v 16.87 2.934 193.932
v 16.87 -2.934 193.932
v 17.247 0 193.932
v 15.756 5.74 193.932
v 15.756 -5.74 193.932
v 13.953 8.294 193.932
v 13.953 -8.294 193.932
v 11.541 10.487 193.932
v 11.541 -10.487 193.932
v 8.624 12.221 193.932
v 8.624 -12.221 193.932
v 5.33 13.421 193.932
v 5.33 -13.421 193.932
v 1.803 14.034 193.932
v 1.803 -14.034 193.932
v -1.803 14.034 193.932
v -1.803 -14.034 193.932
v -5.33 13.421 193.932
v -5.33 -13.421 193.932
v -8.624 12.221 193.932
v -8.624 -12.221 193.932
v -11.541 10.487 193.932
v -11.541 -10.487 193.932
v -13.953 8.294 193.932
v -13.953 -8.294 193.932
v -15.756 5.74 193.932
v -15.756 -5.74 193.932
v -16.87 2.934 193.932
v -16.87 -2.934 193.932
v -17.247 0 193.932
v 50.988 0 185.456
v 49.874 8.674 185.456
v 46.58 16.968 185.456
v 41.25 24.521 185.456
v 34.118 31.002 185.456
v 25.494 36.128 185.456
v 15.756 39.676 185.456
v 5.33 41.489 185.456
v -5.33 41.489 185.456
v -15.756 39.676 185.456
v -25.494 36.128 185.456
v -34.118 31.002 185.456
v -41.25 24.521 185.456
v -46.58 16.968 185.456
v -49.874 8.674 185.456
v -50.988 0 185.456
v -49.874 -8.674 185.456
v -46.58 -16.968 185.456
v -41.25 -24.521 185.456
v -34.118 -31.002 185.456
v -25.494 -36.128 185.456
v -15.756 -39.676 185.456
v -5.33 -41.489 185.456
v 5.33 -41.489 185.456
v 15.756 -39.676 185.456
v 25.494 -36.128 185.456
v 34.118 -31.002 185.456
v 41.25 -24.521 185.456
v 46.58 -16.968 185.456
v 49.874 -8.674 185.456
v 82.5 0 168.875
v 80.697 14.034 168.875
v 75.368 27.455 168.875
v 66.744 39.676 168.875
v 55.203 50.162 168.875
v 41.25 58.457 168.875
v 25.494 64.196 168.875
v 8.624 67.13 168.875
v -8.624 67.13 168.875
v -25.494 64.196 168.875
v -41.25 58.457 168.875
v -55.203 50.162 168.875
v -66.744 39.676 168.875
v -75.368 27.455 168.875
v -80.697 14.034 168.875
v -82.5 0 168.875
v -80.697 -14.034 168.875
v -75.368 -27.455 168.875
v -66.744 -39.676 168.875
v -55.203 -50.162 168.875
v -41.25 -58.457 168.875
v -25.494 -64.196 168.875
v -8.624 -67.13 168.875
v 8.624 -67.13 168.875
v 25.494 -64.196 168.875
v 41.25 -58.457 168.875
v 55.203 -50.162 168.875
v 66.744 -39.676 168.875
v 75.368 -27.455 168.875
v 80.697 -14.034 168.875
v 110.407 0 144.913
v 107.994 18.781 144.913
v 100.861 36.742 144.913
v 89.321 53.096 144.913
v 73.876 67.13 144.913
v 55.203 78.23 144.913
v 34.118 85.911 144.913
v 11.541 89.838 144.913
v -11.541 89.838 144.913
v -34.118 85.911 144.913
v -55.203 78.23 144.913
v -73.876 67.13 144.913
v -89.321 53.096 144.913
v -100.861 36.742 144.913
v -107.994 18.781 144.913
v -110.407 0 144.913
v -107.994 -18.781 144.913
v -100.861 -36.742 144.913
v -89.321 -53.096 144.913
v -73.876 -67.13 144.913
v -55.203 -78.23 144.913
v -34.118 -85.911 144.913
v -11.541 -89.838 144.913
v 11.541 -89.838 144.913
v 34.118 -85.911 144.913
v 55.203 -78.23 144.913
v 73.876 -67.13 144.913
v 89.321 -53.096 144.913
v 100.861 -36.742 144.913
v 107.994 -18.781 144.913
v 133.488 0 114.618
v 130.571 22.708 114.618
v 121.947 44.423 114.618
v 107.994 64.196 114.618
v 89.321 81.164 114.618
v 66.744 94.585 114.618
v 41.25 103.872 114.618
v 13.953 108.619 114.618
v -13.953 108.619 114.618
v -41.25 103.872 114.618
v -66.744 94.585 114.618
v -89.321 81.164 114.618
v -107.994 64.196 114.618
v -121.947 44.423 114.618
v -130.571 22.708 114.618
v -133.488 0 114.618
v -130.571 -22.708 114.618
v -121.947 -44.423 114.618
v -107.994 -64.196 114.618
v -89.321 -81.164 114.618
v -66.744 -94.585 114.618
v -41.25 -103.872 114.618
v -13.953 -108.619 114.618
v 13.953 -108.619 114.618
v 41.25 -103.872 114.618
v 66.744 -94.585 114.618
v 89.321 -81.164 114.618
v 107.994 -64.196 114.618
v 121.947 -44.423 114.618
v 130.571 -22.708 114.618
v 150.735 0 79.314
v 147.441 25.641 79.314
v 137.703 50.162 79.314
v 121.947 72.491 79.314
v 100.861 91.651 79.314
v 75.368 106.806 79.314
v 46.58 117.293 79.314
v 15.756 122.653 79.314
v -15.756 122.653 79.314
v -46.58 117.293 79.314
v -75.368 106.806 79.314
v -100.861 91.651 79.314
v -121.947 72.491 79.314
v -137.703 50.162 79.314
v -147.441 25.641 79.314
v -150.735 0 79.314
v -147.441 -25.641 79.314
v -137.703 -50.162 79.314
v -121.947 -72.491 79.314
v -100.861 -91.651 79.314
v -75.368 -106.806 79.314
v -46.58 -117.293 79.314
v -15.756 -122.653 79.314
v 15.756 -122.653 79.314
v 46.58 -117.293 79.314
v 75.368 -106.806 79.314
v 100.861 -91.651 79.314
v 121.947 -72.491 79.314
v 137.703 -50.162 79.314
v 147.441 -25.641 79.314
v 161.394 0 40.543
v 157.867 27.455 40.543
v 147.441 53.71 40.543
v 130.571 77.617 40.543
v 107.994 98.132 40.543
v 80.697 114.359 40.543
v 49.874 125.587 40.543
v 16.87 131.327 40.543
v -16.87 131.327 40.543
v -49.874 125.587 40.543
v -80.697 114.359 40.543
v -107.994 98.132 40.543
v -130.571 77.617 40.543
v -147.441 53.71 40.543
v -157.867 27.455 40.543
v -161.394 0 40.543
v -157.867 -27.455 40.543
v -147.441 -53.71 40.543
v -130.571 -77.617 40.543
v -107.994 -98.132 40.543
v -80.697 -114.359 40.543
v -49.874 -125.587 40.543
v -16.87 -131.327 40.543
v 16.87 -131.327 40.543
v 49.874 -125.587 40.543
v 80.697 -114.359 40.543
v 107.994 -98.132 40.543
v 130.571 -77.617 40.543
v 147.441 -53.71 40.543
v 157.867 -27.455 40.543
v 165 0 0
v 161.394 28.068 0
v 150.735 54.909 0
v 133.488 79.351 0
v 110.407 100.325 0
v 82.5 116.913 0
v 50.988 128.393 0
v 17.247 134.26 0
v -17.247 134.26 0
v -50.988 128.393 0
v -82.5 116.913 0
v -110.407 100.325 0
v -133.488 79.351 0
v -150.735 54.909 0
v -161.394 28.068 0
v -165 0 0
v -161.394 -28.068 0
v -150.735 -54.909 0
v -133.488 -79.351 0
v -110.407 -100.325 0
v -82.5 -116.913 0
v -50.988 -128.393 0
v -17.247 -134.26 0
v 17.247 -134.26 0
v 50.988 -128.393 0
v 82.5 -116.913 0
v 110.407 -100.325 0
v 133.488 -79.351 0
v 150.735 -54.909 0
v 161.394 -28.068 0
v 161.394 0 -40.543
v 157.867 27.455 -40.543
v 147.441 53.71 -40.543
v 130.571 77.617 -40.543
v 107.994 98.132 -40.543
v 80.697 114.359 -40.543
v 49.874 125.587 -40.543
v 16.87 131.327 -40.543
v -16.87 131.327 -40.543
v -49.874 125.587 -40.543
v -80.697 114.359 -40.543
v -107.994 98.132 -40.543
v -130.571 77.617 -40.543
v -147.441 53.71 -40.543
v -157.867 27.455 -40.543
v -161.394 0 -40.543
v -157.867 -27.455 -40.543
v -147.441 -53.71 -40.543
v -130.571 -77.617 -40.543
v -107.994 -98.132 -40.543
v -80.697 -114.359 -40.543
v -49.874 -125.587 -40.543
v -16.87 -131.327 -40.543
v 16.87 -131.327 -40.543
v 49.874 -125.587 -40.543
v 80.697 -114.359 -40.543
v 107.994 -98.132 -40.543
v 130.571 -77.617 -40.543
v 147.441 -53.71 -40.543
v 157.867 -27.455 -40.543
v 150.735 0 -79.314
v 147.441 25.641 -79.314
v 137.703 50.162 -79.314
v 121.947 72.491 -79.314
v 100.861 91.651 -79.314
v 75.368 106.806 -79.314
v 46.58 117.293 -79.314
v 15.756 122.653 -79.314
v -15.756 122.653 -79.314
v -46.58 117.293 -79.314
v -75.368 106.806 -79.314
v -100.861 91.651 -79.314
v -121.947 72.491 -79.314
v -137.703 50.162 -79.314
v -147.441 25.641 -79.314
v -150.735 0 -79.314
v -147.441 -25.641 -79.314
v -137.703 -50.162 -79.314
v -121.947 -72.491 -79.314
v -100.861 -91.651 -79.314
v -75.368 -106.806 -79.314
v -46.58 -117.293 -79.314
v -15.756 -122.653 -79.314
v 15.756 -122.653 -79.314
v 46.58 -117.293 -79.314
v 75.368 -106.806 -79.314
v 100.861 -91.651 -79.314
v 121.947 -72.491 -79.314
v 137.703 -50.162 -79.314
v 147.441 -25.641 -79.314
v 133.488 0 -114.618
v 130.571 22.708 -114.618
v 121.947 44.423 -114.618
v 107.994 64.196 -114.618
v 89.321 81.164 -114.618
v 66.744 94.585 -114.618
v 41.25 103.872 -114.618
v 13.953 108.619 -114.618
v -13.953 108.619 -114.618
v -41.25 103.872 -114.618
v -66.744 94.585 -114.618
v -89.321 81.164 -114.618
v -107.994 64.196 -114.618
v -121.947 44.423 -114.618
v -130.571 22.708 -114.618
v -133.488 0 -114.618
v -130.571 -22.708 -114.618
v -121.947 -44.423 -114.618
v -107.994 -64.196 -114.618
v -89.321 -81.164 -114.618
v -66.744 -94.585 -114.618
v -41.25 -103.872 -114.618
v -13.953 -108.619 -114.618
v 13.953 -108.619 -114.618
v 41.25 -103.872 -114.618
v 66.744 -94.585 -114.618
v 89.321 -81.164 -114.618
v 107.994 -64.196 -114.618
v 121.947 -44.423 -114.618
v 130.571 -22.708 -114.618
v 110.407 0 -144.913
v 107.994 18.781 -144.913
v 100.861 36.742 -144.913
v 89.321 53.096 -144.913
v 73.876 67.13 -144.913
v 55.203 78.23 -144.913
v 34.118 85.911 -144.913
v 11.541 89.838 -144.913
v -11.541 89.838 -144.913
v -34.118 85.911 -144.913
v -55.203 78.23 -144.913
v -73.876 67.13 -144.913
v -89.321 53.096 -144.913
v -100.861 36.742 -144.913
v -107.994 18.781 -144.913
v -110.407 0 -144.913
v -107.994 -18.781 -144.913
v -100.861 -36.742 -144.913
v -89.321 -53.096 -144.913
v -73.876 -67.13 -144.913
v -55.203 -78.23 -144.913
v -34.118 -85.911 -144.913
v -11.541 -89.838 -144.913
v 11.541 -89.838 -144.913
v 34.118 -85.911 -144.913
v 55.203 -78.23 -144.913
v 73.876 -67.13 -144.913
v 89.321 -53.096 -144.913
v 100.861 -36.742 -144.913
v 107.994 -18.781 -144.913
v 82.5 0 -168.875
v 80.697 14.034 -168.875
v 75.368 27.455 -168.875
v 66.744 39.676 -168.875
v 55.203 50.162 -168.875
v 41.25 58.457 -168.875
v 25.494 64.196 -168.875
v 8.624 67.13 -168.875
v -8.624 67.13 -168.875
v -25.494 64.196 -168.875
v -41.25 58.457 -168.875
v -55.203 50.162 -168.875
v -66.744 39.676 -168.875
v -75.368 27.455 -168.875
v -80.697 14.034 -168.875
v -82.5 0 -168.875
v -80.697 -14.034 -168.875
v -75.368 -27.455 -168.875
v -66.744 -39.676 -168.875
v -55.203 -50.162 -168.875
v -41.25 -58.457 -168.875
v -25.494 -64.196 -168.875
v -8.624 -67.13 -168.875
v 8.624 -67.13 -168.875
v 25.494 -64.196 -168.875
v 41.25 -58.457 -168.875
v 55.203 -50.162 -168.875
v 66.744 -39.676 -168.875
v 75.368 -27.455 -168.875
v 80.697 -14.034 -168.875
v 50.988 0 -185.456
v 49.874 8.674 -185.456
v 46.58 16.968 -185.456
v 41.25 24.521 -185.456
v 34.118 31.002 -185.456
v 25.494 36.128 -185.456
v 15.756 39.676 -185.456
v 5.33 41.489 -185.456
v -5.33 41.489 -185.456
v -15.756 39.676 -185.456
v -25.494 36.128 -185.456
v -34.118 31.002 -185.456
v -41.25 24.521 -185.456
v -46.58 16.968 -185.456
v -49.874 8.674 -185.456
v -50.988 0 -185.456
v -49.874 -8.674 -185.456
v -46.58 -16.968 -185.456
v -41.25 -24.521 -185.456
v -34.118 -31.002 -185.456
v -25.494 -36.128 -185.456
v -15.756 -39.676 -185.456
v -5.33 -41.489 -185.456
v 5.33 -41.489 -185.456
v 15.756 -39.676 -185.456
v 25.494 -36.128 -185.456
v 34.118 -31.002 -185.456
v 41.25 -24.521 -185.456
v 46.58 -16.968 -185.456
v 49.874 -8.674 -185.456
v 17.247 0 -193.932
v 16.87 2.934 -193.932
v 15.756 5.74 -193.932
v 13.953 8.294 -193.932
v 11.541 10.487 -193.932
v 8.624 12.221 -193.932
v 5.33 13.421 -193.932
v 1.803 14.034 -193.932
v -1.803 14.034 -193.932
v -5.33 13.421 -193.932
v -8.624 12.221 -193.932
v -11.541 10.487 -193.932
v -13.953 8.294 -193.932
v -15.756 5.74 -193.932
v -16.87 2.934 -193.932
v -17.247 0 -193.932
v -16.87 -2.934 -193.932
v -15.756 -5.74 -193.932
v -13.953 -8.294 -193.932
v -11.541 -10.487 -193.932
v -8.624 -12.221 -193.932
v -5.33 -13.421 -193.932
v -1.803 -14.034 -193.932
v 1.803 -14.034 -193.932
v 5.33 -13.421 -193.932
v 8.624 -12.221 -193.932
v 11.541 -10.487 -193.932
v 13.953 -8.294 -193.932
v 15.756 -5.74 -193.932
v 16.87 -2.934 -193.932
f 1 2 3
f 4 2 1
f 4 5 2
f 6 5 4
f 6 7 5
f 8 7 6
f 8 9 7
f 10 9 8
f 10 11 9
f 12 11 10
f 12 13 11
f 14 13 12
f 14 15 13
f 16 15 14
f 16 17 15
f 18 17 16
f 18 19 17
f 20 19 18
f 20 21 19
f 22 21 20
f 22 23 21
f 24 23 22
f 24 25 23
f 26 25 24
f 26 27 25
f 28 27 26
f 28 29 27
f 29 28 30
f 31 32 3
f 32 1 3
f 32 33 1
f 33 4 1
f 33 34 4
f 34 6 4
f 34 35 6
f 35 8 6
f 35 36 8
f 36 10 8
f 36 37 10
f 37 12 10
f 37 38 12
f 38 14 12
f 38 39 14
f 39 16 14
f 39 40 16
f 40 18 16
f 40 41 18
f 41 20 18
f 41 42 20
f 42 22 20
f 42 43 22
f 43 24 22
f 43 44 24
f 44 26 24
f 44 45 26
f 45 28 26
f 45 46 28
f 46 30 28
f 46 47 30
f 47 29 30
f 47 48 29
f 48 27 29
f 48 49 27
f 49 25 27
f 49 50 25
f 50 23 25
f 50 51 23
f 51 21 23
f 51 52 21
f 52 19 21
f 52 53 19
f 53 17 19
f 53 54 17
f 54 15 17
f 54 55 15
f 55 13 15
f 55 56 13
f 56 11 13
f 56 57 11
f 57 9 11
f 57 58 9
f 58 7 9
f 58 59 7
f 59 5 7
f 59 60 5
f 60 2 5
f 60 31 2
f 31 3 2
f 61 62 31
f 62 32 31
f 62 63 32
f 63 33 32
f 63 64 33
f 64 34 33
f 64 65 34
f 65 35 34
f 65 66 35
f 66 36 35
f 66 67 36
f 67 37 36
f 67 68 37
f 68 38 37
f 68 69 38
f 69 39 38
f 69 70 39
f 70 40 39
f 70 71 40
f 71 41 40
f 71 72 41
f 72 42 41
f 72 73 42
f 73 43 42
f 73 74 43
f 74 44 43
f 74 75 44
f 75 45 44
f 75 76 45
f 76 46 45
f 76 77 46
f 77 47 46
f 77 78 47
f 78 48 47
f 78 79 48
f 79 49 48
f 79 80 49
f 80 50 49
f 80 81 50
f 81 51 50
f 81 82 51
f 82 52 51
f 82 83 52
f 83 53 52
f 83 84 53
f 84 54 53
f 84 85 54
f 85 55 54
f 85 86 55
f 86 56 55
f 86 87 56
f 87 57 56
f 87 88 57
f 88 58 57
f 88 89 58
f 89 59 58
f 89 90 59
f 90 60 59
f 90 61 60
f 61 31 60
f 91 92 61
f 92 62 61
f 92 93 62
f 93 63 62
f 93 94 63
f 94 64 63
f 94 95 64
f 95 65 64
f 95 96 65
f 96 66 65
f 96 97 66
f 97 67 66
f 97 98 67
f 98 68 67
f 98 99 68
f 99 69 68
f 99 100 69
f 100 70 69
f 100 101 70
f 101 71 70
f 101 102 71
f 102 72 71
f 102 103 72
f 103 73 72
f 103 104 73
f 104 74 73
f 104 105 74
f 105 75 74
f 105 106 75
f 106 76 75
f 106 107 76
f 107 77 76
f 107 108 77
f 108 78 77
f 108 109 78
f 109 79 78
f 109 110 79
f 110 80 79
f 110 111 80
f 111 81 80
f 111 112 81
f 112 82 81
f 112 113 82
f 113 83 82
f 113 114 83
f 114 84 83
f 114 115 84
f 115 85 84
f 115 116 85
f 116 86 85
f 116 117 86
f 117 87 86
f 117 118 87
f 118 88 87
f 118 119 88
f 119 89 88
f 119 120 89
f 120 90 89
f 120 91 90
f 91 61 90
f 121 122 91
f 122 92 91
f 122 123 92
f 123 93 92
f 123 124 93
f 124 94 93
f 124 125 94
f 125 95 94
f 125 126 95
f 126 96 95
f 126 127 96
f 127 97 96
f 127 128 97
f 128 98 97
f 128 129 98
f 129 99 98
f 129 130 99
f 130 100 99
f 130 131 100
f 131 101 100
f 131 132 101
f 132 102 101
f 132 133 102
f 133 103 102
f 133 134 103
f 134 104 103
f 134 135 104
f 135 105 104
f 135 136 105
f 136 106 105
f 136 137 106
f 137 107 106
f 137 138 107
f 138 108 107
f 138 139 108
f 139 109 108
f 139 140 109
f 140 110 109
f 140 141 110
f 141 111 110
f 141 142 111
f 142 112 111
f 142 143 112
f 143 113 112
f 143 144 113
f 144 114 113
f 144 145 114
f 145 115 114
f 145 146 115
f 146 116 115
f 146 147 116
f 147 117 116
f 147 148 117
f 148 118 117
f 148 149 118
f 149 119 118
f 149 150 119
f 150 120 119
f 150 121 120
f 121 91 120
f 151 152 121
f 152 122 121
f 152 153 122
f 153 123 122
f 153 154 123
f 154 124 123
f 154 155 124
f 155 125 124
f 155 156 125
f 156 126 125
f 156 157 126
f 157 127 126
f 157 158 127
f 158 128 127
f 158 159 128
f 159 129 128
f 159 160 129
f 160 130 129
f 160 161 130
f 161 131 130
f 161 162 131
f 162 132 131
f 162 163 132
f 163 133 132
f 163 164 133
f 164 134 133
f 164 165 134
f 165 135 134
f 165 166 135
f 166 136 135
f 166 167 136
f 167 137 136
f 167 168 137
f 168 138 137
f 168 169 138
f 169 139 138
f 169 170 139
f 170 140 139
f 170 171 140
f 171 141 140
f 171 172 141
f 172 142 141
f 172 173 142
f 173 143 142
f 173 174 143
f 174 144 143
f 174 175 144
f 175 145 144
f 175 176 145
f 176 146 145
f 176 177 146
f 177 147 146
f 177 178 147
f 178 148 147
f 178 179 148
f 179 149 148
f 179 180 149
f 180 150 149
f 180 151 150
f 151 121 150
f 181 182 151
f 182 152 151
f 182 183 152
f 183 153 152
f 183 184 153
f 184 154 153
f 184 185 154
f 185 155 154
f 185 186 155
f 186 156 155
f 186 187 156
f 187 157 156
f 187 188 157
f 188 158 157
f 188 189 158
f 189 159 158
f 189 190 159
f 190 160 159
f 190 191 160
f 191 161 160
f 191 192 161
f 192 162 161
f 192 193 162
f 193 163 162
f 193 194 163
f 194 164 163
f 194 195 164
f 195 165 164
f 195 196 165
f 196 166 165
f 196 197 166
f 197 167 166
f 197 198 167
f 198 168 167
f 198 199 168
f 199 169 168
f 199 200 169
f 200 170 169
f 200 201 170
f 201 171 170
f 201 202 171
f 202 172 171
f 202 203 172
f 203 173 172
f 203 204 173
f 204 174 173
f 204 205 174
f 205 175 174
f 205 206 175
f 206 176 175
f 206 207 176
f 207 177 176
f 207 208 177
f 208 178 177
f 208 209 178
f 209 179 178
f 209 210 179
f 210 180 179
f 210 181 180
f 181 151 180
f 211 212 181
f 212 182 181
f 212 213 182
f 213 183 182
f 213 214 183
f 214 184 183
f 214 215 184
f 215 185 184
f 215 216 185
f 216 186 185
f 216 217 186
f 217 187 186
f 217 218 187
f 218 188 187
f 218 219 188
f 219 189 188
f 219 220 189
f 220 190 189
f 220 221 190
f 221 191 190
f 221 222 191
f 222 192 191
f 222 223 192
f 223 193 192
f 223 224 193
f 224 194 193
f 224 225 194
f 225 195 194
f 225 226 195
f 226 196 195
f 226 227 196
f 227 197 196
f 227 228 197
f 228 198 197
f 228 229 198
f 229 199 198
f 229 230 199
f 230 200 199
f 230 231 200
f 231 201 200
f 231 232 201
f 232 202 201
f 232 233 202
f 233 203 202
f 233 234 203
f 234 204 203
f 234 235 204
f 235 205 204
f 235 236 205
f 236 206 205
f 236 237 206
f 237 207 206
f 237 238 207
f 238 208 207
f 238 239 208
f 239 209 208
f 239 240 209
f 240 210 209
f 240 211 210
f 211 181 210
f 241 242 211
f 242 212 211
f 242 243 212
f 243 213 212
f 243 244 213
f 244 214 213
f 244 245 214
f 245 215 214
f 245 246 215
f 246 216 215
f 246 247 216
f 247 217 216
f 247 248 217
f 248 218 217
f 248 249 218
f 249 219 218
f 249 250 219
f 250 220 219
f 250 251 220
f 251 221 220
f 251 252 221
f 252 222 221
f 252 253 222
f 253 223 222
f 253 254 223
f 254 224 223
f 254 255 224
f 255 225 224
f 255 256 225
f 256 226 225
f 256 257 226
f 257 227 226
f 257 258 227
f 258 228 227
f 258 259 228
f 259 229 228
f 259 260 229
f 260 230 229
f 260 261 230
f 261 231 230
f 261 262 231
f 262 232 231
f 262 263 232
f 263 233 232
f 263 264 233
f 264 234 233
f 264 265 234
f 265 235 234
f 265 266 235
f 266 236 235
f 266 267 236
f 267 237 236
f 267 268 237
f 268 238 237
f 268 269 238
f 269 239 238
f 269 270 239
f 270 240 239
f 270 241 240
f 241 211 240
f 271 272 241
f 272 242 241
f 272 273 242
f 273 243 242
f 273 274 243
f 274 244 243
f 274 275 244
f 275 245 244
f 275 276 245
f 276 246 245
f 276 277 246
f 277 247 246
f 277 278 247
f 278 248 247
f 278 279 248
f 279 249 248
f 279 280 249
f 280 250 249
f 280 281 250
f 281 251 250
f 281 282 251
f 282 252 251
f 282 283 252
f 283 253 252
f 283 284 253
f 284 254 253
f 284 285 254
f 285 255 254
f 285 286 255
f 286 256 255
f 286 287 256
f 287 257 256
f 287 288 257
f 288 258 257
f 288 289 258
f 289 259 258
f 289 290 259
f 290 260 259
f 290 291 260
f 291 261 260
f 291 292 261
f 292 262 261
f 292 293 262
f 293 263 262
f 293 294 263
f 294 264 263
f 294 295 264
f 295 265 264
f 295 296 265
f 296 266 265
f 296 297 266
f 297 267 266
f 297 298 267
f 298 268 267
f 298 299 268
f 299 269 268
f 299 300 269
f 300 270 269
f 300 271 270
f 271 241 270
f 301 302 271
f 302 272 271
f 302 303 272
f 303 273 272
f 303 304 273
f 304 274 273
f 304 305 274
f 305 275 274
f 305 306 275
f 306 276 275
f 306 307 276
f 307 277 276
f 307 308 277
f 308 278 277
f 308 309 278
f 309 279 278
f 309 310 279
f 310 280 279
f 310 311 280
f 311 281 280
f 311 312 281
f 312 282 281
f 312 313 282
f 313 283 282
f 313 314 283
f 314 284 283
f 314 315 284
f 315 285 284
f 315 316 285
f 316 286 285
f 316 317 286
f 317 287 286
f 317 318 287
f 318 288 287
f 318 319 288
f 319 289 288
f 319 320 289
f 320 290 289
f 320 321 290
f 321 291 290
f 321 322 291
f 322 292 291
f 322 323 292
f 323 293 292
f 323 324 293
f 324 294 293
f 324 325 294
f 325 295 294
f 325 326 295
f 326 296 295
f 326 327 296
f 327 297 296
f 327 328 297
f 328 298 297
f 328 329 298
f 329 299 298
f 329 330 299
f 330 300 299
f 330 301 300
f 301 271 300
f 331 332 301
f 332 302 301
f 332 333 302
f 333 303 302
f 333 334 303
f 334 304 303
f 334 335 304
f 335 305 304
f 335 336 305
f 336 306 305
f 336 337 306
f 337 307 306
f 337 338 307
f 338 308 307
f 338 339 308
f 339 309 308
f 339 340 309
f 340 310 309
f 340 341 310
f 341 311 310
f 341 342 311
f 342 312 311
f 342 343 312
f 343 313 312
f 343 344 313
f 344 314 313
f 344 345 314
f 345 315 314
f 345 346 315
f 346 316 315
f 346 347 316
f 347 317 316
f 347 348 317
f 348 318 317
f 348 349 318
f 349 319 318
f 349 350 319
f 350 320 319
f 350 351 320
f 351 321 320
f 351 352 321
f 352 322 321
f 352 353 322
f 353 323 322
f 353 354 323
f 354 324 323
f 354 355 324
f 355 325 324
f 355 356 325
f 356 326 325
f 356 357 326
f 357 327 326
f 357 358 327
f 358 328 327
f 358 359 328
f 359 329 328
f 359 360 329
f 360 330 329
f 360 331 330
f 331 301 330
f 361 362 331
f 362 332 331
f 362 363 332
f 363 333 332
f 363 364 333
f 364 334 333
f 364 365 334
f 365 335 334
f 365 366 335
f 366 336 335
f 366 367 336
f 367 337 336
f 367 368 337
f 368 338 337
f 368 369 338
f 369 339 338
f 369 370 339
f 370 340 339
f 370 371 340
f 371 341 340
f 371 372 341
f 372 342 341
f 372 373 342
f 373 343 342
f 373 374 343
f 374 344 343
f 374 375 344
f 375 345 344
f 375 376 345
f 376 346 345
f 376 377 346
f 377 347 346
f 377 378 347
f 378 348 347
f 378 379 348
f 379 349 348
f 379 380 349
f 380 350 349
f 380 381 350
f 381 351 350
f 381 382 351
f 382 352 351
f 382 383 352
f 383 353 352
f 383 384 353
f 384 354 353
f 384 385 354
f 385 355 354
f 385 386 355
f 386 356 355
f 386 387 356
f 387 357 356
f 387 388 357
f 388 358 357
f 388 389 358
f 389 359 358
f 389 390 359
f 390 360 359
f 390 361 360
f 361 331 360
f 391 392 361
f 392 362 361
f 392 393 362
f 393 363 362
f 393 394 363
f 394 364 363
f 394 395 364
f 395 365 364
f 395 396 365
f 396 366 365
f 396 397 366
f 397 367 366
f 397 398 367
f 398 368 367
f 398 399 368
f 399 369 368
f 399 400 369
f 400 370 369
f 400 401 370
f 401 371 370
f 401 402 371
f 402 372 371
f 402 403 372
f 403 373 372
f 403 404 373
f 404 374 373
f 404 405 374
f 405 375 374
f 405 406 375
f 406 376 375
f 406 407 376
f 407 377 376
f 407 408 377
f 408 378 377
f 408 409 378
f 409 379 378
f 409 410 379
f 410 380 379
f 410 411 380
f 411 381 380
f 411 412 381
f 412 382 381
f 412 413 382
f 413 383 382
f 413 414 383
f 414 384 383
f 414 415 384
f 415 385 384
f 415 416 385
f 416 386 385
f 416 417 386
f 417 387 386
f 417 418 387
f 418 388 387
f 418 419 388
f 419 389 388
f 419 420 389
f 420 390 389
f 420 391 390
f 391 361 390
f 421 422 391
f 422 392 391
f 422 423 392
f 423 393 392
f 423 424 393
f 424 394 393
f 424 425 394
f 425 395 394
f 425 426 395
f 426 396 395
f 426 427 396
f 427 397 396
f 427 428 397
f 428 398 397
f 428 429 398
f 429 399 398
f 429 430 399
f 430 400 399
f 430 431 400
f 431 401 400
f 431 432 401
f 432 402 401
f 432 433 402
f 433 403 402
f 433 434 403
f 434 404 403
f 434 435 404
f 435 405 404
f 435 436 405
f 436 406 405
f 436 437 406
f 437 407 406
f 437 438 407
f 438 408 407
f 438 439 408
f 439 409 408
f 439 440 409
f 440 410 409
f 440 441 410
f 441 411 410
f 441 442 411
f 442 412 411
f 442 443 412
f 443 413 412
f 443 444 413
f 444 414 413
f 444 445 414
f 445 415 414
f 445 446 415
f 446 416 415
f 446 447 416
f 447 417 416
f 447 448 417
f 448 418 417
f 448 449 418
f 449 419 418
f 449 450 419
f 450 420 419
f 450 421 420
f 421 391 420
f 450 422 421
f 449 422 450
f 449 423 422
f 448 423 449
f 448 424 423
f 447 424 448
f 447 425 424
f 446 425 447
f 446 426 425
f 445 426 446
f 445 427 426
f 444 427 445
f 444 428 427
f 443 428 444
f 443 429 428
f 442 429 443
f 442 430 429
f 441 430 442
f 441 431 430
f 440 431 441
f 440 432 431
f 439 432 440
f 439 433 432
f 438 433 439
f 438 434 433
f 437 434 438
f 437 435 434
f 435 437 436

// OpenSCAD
// Generated by SolidPython 1.0.1 on 2020-07-29 00:46:49


scale(v = [11, 9, 13]) {
	sphere(r = 15);
}
/***********************************************
*********      SolidPython code:      **********
************************************************
 
# import packages: SolidPython
from solid import *
from solid.utils import *
from itertools import chain, combinations, permutations


class Resize:

    def __init__(self, scad_file):
        self.scad_file = scad_file
        #self.scad_file = import_scad(scad_file)
        # cone/cylinder param:
        self.r1 = 0
        self.r2 = 0
        self.h = 0
        # rectangular prism param:
        self.w = 0
        self.l = 0
        # ellipse param:
        self.r = 0

    # import OpenScad code (file name corresponds to shape)


    # classify shape + parameters
    def assign(self, param1, param2, param3):
        if self.scad_file == 'cone.scad':
            self.r1 = param1
            self.r2 = param2
            self.h = param3
        elif self.scad_file == 'cylinder.scad':
            self.r1 = param1
            self.r2 = param2
            self.h = param3
        elif self.scad_file == 'rectangularPrism.scad':
            self.h = param1
            self.l = param2
            self.w = param3
        else:
            self.r = param1
            self.h = param2

    # resize parameters
    def iterate(self):
        x = range(3, 20, 2)
        i = 1
        if self.scad_file == 'cone.scad':
            tempList = list(permutations(x, 2))
            for temp in tempList:
                param1 = temp[0]
                param2 = temp[1]
                filepath = 'produced_scad_files/' + 'cone' + str(param1) + '_' + str(param2) + '_' + '.scad'
                scad_render_to_file(cylinder(h=param1, r1=param2, r2=0), filepath)

        elif self.scad_file == 'cylinder.scad':
            tempList = list(permutations(x, 3))
            for temp in tempList:
                param1 = temp[0]
                param2 = temp[1]
                filepath = 'produced_scad_files/' + 'cylinder' + str(param1) + '_' + str(param2) + '_' + '.scad'
                scad_render_to_file(cylinder(h=param1, r1=param2, r2=param2), filepath)

        elif self.scad_file == 'rectangularPrism.scad':
            tempList = list(permutations(x, 3))
            for temp in tempList:
                param1 = temp[0]
                param2 = temp[1]
                param3 = temp[2]
                filepath = 'produced_scad_files/' + 'rectangularPrism' + str(param1) + '_' + str(param2) + '_' + str(
                    param3) + '.scad'
                scad_render_to_file(cube(size=(param1, param2, param3)), filepath)

        elif self.scad_file == 'ellipse.scad':
            tempList = list(permutations(x, 4))
            for temp in tempList:
                param1 = temp[0]
                param2 = temp[1]
                param3 = temp[2]
                param4 = temp[3]
                filepath = 'produced_scad_files/' + 'ellipse' + str(param1) + '_' + str(param2) + '_' + str(param3) + '_' + str(param4) + '.scad'
                scad_render_to_file(scale([param1, param2, param3])(sphere(r=param4)), filepath)

    def render_to_scadfile(self):
        scad_render_to_file(scad, 'example.scad') 
 
************************************************/
